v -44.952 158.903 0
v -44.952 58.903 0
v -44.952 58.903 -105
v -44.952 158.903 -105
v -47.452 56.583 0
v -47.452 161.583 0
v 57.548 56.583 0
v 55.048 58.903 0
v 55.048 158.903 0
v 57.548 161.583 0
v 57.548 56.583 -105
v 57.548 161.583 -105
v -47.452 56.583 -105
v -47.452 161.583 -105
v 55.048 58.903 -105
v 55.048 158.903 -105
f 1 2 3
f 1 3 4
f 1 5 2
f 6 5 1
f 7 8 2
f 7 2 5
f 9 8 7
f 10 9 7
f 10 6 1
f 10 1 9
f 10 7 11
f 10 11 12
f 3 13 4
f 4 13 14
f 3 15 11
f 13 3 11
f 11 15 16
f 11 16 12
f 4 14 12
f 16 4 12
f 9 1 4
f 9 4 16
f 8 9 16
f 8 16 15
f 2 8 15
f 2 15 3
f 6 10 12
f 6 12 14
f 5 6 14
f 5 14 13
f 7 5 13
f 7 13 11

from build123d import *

# Parameters (mm, degrees)
F1_DEPTH = 105


with BuildPart() as f1:
    # F0 (on Top) → F1 (new body)
    with BuildSketch(Plane.XY):
        Polygon((-47.451783, 161.583327), (-47.451783, 56.583327), (57.548217, 56.583327), (57.548217, 161.583327), (-44.951783, 161.583327), align=None)
        Polygon((-44.951783, 109.083327), (-44.951783, 158.90345), (55.048217, 158.90345), (55.048217, 58.90345), (-44.951783, 58.90345), align=None, mode=Mode.SUBTRACT)
    extrude(amount=-F1_DEPTH)


solid = f1.part
